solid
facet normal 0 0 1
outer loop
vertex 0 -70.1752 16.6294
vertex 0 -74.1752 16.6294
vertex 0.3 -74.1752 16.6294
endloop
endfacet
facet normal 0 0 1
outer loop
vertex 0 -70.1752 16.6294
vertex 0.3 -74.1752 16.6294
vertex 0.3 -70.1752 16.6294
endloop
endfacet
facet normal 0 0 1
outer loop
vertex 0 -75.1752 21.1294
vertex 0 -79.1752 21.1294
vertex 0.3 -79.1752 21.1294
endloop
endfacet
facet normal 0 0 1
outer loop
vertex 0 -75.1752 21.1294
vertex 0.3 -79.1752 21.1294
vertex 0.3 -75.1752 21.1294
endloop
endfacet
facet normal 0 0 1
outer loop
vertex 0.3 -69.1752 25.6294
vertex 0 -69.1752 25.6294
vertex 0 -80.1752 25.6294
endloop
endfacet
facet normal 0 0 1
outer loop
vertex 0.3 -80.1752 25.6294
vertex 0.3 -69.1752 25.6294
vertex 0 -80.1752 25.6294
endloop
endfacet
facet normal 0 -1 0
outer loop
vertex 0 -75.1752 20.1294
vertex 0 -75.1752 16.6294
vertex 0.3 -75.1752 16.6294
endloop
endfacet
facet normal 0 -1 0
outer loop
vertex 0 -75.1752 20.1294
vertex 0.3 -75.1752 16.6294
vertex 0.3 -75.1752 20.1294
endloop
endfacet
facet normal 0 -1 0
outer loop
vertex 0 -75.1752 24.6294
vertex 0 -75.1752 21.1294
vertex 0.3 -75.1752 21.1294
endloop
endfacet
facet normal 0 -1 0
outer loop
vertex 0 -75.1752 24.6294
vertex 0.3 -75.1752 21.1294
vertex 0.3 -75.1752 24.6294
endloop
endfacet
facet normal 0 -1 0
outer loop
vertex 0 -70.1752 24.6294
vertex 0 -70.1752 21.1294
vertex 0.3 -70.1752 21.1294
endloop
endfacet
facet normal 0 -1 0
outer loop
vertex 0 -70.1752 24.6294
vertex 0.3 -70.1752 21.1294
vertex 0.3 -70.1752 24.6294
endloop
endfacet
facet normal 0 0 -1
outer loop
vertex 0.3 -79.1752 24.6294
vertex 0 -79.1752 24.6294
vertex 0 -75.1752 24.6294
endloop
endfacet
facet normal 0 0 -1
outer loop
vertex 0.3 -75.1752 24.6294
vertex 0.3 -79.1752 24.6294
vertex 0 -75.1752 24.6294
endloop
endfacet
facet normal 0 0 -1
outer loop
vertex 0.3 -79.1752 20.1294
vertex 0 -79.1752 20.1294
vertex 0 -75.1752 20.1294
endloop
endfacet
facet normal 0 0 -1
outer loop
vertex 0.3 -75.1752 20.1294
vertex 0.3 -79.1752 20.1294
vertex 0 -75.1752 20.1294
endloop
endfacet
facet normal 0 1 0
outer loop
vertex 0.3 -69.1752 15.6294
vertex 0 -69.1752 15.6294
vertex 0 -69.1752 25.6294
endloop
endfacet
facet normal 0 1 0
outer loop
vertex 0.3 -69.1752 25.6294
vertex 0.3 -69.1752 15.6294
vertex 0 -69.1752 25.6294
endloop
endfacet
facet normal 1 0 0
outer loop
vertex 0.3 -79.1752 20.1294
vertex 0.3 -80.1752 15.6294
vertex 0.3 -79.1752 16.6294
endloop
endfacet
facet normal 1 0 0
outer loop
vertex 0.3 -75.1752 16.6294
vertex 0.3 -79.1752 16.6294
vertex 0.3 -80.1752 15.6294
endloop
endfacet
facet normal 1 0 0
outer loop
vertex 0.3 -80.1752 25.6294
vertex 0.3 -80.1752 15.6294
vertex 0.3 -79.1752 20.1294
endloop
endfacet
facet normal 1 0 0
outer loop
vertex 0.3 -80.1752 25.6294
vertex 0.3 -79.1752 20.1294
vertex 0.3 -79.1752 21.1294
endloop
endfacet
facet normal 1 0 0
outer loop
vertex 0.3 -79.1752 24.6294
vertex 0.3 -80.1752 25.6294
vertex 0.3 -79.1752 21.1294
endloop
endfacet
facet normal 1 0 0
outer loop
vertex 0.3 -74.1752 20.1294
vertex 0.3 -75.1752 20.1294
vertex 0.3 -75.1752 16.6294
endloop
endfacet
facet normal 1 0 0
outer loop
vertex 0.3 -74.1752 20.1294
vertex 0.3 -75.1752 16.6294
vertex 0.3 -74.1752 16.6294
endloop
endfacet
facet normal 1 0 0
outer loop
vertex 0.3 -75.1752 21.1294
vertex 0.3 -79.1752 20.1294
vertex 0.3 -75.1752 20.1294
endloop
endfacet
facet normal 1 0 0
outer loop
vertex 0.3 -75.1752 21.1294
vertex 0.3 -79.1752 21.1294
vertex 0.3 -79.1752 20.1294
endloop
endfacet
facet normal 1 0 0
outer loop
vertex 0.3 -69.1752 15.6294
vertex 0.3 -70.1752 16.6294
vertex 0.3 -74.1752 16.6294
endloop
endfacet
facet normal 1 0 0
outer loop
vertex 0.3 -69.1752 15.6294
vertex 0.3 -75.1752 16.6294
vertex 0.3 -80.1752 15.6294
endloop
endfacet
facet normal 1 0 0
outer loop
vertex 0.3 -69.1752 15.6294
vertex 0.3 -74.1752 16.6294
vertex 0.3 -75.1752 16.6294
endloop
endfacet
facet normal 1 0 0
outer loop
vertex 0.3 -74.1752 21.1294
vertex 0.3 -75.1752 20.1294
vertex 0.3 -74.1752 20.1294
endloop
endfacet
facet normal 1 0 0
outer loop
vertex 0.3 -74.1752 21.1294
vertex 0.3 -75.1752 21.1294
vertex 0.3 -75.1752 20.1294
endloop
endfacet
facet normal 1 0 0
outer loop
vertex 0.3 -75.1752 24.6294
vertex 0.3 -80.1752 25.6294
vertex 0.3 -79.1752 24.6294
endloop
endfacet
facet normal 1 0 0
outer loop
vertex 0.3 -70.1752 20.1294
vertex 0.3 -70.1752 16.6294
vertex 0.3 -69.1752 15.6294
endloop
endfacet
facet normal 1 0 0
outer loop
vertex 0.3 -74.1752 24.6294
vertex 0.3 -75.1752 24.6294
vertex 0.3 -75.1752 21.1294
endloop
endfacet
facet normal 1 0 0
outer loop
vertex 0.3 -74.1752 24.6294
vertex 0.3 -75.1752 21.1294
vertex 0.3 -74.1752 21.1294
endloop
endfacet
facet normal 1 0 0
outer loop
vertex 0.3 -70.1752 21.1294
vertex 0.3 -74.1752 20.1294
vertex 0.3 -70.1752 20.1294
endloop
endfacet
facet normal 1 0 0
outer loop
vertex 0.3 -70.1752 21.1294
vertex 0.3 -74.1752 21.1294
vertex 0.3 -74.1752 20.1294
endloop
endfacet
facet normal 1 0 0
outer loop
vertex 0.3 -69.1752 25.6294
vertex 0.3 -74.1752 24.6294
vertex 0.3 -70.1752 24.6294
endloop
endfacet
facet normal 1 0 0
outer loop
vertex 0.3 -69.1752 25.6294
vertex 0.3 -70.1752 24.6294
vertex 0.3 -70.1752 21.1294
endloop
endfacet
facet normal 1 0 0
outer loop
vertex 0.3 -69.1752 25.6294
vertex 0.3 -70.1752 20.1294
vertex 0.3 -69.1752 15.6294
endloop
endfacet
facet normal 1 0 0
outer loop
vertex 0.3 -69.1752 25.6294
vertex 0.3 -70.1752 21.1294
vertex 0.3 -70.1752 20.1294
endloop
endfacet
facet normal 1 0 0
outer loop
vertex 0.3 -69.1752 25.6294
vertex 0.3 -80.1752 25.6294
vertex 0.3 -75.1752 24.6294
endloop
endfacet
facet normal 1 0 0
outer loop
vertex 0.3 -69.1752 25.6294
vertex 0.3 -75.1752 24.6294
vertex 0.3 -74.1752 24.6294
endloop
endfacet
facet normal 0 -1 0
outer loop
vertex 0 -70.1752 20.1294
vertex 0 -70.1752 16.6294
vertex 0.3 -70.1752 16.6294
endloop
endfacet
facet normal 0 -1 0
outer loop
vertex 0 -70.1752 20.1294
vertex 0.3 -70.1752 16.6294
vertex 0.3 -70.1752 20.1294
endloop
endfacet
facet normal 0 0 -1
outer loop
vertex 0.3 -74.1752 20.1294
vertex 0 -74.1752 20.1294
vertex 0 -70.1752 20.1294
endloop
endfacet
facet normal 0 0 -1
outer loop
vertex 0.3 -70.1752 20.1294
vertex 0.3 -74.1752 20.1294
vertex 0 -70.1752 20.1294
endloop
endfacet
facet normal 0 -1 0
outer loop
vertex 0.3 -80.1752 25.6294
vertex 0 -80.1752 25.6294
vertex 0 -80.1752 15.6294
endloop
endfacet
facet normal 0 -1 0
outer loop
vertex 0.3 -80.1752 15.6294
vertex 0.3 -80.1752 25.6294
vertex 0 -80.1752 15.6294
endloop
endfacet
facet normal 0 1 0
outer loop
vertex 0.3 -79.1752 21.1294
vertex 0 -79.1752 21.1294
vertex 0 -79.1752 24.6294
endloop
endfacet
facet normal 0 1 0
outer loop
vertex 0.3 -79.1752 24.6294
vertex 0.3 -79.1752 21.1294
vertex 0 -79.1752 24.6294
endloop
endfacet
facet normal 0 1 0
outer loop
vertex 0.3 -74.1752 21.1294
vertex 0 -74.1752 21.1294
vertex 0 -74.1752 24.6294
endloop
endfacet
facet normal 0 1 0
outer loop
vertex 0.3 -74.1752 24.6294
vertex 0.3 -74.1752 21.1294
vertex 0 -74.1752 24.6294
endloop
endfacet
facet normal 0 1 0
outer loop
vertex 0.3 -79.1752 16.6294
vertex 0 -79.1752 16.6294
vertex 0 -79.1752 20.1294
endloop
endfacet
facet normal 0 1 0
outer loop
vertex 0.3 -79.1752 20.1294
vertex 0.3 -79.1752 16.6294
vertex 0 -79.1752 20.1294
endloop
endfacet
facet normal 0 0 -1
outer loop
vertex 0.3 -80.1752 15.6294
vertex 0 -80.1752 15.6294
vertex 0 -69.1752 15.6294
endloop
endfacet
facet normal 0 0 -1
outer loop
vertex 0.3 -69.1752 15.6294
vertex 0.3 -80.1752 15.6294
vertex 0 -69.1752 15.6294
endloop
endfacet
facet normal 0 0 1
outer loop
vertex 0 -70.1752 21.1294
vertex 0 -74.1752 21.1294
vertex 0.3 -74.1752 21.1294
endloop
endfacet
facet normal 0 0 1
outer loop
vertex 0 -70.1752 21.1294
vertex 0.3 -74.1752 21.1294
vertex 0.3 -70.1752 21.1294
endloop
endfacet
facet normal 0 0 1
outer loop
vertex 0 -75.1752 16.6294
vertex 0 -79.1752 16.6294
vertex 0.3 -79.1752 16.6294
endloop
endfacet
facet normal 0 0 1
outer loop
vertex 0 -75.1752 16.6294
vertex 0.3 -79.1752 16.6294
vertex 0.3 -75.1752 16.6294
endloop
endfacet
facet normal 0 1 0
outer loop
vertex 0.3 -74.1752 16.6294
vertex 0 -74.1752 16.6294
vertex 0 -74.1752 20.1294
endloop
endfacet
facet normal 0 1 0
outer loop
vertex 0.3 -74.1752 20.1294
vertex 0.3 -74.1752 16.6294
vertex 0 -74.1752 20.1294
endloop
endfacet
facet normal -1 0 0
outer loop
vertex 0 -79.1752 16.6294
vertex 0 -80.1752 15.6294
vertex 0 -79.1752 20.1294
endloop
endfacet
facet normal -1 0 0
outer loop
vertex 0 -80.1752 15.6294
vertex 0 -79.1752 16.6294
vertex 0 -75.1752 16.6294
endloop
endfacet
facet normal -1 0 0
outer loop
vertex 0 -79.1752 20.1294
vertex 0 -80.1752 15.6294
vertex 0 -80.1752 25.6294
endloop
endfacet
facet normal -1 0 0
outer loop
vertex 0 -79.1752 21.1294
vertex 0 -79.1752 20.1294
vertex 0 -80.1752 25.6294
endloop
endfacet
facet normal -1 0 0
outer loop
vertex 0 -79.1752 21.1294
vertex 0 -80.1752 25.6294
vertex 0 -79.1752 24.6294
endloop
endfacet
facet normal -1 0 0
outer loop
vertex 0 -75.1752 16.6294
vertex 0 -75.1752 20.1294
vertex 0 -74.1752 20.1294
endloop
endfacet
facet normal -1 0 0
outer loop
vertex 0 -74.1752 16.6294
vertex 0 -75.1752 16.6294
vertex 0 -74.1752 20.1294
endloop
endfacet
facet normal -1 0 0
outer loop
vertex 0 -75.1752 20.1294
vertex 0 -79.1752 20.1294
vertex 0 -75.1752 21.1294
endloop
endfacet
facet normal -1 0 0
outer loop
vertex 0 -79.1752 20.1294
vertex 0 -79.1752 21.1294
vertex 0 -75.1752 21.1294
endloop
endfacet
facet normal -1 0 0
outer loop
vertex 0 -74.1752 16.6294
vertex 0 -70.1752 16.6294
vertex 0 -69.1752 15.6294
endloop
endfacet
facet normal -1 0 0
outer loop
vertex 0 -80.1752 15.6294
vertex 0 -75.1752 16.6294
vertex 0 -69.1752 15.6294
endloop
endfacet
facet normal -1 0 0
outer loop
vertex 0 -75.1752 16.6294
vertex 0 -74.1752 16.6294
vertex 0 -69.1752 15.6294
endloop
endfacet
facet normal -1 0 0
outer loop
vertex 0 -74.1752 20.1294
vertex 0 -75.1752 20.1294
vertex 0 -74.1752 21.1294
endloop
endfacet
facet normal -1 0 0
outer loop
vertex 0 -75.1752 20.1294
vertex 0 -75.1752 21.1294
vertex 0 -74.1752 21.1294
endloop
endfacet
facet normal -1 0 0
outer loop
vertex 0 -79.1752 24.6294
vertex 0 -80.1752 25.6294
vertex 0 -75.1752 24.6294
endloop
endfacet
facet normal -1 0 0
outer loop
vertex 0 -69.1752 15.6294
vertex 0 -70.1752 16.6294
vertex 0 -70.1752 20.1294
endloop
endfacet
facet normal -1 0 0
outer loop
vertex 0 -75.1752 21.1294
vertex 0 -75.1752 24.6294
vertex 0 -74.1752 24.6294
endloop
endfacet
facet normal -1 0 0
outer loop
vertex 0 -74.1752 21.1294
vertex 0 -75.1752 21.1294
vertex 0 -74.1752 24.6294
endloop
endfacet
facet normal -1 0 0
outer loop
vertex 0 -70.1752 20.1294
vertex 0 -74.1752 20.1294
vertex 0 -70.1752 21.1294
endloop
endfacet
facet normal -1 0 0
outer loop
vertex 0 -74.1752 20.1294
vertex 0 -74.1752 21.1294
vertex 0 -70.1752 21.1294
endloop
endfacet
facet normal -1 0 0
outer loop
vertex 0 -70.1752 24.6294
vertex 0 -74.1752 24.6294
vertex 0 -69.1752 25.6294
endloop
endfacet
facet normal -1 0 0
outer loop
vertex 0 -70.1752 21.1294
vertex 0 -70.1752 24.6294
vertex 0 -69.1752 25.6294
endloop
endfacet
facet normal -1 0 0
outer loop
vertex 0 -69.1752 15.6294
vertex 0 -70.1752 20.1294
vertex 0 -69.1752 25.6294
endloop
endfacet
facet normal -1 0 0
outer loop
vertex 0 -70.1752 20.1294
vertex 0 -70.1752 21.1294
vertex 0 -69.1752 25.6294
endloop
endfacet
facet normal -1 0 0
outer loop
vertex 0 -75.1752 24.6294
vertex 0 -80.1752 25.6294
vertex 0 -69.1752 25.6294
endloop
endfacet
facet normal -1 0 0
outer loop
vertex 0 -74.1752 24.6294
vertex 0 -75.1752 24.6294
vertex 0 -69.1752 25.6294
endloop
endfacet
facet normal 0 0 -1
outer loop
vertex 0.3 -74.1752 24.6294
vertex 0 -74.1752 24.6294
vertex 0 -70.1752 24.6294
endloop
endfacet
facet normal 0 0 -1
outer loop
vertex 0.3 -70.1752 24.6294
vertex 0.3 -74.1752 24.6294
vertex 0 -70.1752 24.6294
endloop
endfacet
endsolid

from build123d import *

# Parameters (mm, degrees)
F0_W     = 4
F0_H     = 3.5
F1_DEPTH = 0.3


with BuildPart() as f1:
    # F0 (on Right) → F1 (new body)
    with BuildSketch(Plane.YZ):
        Polygon((-75.175237, 25.629358), (-80.175237, 25.629358), (-80.175237, 21.129358), (-80.175237, 20.129358), (-80.175237, 15.629358), (-75.175237, 15.629358), (-74.175237, 15.629358), (-69.175237, 15.629358), (-69.175237, 20.129358), (-69.175237, 21.129358), (-69.175237, 25.629358), (-74.175237, 25.629358), align=None)
        with Locations((-77.175237, 18.379358)):
            Rectangle(F0_W, F0_H, mode=Mode.SUBTRACT)
        with Locations((-72.175237, 18.379358)):
            Rectangle(F0_W, F0_H, mode=Mode.SUBTRACT)
        with Locations((-77.175237, 22.879358)):
            Rectangle(F0_W, F0_H, mode=Mode.SUBTRACT)
        with Locations((-72.175237, 22.879358)):
            Rectangle(F0_W, F0_H, mode=Mode.SUBTRACT)
    extrude(amount=F1_DEPTH)


solid = f1.part
